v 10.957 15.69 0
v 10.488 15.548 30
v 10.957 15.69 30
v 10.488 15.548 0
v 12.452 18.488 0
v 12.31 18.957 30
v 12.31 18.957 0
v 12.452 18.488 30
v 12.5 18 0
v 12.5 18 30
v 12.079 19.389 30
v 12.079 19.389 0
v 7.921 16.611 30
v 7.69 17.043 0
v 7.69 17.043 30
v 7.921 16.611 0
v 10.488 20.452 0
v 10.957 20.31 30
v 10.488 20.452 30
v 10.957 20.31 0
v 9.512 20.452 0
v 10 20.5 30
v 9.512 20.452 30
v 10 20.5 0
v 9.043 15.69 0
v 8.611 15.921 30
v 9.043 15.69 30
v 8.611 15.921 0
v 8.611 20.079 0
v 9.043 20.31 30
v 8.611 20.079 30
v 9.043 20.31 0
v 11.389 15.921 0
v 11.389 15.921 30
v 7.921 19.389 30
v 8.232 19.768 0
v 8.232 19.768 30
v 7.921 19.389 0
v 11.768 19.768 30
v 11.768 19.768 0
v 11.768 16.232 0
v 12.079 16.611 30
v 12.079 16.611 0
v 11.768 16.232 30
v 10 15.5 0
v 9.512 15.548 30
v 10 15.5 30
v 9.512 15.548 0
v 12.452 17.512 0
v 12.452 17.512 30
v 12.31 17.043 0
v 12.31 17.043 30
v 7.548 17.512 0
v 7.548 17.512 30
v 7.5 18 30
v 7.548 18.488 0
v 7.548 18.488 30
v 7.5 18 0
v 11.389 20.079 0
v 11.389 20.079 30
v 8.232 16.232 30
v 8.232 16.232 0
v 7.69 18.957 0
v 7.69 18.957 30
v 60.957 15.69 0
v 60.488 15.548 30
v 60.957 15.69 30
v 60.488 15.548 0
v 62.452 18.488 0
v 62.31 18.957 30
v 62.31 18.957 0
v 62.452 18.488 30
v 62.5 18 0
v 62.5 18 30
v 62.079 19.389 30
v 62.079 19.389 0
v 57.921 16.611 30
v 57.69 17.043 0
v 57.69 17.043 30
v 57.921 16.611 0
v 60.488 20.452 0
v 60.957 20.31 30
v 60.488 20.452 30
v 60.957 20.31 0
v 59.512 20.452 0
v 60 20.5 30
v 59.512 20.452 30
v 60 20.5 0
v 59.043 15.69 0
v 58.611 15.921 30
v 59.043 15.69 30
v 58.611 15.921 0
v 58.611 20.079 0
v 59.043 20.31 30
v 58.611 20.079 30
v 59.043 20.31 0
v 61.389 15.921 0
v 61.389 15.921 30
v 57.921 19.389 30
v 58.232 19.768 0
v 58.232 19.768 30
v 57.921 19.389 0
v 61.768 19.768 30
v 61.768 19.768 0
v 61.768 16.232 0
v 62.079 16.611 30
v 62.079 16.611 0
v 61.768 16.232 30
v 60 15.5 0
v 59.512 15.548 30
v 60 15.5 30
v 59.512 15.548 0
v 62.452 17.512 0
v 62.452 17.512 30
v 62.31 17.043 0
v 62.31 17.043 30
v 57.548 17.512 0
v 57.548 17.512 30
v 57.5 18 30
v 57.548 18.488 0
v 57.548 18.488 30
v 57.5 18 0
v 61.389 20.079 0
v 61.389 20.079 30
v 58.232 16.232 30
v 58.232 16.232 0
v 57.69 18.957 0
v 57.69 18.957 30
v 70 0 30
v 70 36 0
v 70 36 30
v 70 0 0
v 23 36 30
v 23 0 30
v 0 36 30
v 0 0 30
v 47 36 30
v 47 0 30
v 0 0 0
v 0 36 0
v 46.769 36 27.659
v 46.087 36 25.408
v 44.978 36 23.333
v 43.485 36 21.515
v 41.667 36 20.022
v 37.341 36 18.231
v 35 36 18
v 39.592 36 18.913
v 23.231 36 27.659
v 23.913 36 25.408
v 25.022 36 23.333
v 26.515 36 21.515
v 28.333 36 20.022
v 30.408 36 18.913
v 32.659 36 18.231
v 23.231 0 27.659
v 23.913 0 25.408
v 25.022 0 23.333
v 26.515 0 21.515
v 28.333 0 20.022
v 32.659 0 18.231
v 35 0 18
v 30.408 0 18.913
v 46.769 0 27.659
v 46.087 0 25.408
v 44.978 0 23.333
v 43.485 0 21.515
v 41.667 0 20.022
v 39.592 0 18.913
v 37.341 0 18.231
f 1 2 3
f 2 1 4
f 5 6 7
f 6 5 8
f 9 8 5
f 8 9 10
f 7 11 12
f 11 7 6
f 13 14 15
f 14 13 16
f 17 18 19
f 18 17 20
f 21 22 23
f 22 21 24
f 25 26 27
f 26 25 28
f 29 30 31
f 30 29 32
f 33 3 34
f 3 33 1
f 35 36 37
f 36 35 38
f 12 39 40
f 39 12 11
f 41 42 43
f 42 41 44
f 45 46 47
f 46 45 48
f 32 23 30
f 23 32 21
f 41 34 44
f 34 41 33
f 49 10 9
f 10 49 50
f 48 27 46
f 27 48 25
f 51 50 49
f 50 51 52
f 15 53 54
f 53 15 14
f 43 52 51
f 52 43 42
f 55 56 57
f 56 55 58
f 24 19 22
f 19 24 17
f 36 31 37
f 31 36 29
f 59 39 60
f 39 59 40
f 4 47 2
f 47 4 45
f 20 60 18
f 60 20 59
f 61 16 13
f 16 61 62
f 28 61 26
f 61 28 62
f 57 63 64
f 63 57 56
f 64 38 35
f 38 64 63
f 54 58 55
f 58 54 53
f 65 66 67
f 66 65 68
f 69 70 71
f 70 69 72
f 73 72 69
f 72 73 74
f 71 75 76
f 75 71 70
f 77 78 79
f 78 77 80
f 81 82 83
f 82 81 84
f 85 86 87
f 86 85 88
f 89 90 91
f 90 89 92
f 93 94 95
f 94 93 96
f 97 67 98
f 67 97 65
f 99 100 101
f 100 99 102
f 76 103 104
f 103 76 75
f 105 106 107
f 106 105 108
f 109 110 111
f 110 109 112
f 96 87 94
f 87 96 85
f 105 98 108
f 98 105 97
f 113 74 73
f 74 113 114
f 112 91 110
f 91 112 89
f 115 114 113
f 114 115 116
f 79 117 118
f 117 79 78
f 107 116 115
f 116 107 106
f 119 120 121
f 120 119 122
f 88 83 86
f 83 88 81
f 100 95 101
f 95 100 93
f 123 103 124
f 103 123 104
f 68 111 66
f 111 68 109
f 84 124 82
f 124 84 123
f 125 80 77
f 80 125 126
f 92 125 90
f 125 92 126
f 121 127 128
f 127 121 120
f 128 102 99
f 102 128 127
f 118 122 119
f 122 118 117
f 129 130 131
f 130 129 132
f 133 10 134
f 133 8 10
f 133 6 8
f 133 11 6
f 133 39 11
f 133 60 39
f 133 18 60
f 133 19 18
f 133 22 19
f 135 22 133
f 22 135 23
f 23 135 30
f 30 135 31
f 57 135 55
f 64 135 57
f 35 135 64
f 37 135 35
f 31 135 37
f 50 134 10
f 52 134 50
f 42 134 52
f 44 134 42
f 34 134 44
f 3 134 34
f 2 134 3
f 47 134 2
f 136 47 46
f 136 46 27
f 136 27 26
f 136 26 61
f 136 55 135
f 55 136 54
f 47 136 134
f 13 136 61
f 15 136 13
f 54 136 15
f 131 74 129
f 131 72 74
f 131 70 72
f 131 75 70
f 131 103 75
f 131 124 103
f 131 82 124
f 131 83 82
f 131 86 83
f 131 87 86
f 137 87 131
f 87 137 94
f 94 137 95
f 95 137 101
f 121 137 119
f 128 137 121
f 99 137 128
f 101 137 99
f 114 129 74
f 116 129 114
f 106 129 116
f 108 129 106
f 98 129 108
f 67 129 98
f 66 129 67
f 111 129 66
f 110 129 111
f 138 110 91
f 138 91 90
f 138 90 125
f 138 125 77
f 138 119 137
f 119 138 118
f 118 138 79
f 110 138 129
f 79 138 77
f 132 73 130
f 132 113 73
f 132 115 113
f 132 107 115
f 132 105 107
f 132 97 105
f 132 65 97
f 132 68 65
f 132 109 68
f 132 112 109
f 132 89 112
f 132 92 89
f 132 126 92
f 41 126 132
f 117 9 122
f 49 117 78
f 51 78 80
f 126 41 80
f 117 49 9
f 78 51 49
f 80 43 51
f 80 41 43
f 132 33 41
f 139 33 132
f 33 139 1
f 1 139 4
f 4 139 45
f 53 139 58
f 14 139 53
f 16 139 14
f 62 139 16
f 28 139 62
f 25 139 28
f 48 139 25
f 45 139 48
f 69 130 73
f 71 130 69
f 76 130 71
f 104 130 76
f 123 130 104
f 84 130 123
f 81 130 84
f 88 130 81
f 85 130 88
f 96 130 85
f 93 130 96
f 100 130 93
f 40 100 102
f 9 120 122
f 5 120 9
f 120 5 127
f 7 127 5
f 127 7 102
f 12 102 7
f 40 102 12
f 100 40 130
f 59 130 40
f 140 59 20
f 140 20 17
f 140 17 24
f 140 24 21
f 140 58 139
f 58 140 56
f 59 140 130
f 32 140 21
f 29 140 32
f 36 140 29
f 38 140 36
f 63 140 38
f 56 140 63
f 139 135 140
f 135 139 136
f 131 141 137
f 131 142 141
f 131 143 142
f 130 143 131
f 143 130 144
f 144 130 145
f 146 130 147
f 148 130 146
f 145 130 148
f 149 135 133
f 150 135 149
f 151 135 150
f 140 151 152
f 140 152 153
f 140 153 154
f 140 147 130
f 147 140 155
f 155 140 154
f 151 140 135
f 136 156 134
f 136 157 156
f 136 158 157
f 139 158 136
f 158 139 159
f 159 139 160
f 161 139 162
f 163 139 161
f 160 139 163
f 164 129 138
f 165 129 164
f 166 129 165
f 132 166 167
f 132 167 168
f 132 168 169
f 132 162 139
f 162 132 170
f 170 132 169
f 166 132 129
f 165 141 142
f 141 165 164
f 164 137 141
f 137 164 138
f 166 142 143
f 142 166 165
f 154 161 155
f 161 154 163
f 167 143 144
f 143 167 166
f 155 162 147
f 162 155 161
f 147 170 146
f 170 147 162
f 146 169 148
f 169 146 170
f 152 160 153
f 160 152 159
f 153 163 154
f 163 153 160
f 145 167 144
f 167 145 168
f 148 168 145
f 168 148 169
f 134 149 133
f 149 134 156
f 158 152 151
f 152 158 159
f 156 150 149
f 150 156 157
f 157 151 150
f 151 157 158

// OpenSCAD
$fn = 32;

// ----------------------------------------------------------------------
// Saddle clamp: plain shaft clamp
// ----------------------------------------------------------------------

// --- parameters (mm) ---
blk_l = 70;               // block length, X
blk_w = 36;               // block width, Y
blk_h = 30;               // block height
clamp_r = 12;             // shaft groove radius
hole_r = 2.5;             // bolt hole radius
hole_m = 10;              // bolt hole margin from the ends

saw_depth = clamp_r + 3;  // saw kerf depth

difference() {
  cube([blk_l, blk_w, blk_h]);
  translate([blk_l / 2, -1, blk_h])
    rotate([-90, 0, 0])
      cylinder(h = blk_w + 2, r = clamp_r);
  for (sx = [0, 1])
    translate([sx ? blk_l - hole_m : hole_m, blk_w / 2, -1])
      cylinder(r = hole_r, h = blk_h + 2);
}
